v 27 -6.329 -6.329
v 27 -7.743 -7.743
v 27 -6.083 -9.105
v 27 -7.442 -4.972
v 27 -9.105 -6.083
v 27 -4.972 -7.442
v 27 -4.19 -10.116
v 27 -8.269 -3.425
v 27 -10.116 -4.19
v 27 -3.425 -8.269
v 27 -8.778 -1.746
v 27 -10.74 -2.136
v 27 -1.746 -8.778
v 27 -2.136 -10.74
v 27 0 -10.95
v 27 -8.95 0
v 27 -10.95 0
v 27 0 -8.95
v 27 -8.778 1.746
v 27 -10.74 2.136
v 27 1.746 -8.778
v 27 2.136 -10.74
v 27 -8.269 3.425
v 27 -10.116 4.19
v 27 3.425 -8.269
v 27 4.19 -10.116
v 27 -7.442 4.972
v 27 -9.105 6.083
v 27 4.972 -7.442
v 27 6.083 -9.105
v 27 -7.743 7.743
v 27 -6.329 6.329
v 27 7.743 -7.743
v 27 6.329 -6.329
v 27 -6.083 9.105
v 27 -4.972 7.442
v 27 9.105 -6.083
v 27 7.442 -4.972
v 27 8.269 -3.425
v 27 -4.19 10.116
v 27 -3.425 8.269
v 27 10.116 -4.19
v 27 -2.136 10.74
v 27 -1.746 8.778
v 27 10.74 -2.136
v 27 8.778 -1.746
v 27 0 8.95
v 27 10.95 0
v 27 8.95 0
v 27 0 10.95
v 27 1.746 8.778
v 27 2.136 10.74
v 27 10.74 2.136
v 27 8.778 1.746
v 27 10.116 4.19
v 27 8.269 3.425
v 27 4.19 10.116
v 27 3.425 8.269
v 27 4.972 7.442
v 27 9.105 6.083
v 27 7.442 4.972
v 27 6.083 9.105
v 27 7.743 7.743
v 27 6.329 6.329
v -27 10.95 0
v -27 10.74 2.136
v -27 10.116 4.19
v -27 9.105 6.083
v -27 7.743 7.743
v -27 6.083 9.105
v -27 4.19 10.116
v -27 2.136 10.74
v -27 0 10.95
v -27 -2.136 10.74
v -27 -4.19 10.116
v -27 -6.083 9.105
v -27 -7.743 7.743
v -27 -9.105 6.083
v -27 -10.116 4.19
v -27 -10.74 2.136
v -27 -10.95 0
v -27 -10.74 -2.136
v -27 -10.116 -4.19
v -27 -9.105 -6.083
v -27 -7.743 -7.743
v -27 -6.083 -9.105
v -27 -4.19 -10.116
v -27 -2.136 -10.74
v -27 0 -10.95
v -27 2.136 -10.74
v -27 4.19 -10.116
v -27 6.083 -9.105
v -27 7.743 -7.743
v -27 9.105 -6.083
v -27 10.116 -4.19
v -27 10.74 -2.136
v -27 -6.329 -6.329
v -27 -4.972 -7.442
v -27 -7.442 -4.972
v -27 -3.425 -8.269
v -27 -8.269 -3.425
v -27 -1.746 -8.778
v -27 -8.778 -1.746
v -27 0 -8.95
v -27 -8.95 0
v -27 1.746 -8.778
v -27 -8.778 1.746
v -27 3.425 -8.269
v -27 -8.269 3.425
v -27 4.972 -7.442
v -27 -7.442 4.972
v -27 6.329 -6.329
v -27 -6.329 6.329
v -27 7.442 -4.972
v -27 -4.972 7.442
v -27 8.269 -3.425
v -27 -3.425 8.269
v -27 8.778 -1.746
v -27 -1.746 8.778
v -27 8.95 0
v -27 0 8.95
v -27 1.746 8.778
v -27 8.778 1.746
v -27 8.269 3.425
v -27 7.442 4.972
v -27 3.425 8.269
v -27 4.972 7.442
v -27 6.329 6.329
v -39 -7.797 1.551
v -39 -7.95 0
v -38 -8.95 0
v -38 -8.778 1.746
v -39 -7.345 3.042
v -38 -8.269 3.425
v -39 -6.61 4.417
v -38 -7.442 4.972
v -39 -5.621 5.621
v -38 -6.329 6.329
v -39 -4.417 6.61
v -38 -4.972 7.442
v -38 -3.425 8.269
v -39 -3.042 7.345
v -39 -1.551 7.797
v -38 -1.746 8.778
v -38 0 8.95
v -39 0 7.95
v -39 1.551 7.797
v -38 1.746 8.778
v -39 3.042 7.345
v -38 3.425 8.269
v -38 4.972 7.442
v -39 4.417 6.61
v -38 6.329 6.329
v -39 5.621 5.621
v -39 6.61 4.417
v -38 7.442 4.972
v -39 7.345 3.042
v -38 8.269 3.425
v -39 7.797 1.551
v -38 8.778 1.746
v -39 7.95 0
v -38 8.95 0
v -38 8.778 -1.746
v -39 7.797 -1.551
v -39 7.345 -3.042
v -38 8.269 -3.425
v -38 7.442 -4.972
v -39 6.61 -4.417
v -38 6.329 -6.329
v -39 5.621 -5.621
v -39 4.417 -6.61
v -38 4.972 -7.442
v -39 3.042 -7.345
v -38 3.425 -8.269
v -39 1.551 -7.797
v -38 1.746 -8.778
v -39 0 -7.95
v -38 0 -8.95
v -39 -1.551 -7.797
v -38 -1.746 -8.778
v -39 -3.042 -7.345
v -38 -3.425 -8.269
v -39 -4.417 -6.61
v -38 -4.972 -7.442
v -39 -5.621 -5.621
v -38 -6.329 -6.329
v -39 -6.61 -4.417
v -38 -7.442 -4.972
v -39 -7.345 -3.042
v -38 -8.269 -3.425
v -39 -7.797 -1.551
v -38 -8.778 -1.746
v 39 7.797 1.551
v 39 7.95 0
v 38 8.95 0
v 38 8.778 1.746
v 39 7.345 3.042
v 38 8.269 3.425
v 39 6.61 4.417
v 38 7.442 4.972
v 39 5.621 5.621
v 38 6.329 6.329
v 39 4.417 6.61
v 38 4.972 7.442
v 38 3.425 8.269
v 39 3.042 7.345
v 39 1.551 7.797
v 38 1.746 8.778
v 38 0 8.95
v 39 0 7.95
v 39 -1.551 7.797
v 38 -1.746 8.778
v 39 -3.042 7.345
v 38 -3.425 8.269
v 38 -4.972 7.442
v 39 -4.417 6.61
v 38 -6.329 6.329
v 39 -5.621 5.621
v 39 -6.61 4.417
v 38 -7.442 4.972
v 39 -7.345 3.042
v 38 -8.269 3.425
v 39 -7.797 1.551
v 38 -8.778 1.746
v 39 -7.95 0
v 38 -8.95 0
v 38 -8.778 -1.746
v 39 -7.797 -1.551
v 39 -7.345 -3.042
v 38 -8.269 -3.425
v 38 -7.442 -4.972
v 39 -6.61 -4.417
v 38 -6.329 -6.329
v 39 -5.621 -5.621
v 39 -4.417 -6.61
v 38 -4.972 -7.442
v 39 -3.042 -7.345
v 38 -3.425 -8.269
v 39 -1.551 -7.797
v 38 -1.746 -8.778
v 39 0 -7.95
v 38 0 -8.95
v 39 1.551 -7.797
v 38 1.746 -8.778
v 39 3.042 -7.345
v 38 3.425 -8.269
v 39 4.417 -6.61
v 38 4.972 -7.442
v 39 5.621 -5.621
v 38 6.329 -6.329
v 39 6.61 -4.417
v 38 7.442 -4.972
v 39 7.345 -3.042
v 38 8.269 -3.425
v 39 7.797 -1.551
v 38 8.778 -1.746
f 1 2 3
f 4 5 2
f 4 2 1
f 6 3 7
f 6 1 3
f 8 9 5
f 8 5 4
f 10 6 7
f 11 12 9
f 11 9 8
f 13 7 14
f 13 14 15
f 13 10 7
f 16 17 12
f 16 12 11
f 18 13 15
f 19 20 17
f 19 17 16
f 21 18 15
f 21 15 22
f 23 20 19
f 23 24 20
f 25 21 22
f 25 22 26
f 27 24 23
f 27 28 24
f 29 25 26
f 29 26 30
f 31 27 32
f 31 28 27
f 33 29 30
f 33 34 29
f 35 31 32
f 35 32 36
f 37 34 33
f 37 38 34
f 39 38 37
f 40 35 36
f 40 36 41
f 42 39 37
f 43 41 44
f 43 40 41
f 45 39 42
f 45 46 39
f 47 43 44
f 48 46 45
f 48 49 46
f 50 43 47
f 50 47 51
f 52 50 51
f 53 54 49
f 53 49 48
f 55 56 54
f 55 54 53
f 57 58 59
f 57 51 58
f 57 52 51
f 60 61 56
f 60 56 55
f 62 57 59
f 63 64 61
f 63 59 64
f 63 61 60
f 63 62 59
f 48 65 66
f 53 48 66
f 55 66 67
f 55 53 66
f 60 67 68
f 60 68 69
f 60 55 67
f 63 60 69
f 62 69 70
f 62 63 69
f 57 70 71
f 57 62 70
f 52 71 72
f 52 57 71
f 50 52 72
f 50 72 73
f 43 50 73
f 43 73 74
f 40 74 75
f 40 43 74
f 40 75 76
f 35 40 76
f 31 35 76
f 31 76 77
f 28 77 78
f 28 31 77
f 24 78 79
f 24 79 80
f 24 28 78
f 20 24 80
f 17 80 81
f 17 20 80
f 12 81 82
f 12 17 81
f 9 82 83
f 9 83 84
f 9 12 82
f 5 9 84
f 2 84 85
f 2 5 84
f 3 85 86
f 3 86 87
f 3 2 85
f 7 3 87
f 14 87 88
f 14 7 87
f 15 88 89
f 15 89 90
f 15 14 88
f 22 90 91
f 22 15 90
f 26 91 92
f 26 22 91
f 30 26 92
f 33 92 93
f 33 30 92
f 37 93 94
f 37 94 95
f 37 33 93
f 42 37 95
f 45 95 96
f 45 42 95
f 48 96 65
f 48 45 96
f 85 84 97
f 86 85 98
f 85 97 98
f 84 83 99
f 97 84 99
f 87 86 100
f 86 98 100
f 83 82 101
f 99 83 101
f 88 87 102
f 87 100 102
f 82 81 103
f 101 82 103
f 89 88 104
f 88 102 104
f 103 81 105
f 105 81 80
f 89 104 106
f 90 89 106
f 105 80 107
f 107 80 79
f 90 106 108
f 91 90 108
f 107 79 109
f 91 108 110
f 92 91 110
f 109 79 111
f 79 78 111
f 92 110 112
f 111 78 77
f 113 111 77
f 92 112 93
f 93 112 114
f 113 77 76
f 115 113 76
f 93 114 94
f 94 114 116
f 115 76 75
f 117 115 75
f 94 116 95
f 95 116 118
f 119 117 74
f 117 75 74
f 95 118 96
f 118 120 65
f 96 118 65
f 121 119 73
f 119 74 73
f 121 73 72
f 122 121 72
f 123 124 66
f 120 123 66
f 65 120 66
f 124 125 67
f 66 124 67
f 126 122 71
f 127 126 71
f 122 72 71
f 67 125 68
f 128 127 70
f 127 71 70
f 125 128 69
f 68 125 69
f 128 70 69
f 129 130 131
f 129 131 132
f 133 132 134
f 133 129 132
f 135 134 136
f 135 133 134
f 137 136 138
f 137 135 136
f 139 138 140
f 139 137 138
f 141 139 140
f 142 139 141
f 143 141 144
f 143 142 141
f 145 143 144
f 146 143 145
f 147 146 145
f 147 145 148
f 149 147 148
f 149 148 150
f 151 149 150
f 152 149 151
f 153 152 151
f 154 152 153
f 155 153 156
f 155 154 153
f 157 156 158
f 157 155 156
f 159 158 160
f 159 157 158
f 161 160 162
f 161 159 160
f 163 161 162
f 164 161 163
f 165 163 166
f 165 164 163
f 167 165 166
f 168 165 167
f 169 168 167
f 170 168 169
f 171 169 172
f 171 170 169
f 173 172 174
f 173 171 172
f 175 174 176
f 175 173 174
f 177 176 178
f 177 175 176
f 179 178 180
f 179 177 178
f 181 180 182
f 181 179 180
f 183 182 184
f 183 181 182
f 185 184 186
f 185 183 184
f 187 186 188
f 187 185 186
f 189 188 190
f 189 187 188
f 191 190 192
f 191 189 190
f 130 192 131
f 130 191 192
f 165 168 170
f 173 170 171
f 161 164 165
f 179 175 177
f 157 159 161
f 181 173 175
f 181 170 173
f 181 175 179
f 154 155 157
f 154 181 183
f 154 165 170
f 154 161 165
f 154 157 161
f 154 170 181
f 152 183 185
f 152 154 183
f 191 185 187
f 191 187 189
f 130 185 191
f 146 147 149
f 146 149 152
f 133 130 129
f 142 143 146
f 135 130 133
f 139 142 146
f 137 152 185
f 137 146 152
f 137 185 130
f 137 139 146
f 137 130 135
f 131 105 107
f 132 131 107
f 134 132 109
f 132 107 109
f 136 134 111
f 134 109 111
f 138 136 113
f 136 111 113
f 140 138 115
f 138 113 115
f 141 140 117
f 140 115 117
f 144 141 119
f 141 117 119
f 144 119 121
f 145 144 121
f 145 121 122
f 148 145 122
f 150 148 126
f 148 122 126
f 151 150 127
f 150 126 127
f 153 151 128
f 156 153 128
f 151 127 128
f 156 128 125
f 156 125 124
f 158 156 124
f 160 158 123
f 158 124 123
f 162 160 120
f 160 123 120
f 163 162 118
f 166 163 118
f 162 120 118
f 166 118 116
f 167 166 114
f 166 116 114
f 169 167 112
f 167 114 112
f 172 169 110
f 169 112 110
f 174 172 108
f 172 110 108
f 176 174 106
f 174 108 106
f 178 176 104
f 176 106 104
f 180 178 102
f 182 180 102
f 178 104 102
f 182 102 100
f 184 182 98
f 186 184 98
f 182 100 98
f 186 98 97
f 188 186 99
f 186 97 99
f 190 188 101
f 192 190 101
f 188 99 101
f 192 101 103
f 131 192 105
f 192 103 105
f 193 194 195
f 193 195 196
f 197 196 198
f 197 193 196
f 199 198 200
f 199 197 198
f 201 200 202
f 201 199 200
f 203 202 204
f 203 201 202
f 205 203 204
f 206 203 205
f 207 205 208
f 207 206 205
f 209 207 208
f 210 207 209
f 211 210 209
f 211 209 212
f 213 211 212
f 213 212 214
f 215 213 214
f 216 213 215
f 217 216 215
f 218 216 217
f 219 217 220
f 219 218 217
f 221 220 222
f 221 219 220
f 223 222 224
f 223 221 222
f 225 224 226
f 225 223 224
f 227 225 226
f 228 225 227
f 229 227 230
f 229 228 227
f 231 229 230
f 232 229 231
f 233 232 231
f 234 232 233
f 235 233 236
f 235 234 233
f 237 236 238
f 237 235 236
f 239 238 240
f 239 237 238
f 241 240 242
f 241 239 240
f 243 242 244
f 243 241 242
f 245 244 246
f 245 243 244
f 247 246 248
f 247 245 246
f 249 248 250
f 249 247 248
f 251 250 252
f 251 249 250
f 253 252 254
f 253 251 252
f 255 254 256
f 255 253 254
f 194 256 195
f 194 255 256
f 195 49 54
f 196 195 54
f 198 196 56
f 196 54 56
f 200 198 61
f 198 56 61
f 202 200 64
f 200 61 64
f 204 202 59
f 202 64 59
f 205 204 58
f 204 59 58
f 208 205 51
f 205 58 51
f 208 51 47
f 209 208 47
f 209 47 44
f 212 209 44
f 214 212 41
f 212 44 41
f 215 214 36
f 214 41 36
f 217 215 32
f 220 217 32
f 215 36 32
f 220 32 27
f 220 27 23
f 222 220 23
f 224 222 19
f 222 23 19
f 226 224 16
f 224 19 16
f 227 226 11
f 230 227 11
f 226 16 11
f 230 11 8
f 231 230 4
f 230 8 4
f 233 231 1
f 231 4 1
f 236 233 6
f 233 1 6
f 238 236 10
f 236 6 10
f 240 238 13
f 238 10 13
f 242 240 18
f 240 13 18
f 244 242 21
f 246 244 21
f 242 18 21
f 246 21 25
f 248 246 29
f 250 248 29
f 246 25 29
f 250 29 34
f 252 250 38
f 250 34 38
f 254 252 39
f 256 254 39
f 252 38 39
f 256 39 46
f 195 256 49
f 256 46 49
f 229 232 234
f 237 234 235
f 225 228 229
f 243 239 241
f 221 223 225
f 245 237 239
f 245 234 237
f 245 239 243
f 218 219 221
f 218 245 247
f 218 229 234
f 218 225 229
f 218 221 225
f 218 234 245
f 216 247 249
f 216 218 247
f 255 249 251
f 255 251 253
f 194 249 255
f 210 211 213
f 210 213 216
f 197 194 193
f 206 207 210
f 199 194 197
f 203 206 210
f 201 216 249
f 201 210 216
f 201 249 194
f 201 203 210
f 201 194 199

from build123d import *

# Parameters (mm, degrees)
F0_R          = 10.95
F1_DEPTH      = 27
F1_DEPTH_BACK = 27
F2_R          = 8.95
F3_DEPTH      = 12
F4_SIZE       = 1
F5_R          = 8.95
F6_DEPTH      = 12
F7_SIZE       = 1


with BuildPart() as f1:
    # F0 (on Right) → F1 (new body, two sides)
    with BuildSketch(Plane.YZ) as f1_sk:
        Circle(F0_R)
    extrude(amount=F1_DEPTH)
    extrude(f1_sk.sketch, amount=-F1_DEPTH_BACK)

    # F2 (on face) → F3 (join)
    with BuildSketch(Plane.YZ.offset(27)):
        Circle(F2_R)
    extrude(amount=F3_DEPTH)

    # F4
    f4_edges = [f1.edges().sort_by_distance(p)[0] for p in [
        (39, -8.95, 0),
    ]]
    chamfer(f4_edges, length=F4_SIZE)

    # F5 (on face) → F6 (join)
    with BuildSketch(Plane(origin=(-27, 0, 0), x_dir=(0, -1, 0), z_dir=(-1, 0, 0))):
        Circle(F5_R)
    extrude(amount=F6_DEPTH)

    # F7
    f7_edges = [f1.edges().sort_by_distance(p)[0] for p in [
        (-39, 8.95, 0),
    ]]
    chamfer(f7_edges, length=F7_SIZE)


solid = f1.part
